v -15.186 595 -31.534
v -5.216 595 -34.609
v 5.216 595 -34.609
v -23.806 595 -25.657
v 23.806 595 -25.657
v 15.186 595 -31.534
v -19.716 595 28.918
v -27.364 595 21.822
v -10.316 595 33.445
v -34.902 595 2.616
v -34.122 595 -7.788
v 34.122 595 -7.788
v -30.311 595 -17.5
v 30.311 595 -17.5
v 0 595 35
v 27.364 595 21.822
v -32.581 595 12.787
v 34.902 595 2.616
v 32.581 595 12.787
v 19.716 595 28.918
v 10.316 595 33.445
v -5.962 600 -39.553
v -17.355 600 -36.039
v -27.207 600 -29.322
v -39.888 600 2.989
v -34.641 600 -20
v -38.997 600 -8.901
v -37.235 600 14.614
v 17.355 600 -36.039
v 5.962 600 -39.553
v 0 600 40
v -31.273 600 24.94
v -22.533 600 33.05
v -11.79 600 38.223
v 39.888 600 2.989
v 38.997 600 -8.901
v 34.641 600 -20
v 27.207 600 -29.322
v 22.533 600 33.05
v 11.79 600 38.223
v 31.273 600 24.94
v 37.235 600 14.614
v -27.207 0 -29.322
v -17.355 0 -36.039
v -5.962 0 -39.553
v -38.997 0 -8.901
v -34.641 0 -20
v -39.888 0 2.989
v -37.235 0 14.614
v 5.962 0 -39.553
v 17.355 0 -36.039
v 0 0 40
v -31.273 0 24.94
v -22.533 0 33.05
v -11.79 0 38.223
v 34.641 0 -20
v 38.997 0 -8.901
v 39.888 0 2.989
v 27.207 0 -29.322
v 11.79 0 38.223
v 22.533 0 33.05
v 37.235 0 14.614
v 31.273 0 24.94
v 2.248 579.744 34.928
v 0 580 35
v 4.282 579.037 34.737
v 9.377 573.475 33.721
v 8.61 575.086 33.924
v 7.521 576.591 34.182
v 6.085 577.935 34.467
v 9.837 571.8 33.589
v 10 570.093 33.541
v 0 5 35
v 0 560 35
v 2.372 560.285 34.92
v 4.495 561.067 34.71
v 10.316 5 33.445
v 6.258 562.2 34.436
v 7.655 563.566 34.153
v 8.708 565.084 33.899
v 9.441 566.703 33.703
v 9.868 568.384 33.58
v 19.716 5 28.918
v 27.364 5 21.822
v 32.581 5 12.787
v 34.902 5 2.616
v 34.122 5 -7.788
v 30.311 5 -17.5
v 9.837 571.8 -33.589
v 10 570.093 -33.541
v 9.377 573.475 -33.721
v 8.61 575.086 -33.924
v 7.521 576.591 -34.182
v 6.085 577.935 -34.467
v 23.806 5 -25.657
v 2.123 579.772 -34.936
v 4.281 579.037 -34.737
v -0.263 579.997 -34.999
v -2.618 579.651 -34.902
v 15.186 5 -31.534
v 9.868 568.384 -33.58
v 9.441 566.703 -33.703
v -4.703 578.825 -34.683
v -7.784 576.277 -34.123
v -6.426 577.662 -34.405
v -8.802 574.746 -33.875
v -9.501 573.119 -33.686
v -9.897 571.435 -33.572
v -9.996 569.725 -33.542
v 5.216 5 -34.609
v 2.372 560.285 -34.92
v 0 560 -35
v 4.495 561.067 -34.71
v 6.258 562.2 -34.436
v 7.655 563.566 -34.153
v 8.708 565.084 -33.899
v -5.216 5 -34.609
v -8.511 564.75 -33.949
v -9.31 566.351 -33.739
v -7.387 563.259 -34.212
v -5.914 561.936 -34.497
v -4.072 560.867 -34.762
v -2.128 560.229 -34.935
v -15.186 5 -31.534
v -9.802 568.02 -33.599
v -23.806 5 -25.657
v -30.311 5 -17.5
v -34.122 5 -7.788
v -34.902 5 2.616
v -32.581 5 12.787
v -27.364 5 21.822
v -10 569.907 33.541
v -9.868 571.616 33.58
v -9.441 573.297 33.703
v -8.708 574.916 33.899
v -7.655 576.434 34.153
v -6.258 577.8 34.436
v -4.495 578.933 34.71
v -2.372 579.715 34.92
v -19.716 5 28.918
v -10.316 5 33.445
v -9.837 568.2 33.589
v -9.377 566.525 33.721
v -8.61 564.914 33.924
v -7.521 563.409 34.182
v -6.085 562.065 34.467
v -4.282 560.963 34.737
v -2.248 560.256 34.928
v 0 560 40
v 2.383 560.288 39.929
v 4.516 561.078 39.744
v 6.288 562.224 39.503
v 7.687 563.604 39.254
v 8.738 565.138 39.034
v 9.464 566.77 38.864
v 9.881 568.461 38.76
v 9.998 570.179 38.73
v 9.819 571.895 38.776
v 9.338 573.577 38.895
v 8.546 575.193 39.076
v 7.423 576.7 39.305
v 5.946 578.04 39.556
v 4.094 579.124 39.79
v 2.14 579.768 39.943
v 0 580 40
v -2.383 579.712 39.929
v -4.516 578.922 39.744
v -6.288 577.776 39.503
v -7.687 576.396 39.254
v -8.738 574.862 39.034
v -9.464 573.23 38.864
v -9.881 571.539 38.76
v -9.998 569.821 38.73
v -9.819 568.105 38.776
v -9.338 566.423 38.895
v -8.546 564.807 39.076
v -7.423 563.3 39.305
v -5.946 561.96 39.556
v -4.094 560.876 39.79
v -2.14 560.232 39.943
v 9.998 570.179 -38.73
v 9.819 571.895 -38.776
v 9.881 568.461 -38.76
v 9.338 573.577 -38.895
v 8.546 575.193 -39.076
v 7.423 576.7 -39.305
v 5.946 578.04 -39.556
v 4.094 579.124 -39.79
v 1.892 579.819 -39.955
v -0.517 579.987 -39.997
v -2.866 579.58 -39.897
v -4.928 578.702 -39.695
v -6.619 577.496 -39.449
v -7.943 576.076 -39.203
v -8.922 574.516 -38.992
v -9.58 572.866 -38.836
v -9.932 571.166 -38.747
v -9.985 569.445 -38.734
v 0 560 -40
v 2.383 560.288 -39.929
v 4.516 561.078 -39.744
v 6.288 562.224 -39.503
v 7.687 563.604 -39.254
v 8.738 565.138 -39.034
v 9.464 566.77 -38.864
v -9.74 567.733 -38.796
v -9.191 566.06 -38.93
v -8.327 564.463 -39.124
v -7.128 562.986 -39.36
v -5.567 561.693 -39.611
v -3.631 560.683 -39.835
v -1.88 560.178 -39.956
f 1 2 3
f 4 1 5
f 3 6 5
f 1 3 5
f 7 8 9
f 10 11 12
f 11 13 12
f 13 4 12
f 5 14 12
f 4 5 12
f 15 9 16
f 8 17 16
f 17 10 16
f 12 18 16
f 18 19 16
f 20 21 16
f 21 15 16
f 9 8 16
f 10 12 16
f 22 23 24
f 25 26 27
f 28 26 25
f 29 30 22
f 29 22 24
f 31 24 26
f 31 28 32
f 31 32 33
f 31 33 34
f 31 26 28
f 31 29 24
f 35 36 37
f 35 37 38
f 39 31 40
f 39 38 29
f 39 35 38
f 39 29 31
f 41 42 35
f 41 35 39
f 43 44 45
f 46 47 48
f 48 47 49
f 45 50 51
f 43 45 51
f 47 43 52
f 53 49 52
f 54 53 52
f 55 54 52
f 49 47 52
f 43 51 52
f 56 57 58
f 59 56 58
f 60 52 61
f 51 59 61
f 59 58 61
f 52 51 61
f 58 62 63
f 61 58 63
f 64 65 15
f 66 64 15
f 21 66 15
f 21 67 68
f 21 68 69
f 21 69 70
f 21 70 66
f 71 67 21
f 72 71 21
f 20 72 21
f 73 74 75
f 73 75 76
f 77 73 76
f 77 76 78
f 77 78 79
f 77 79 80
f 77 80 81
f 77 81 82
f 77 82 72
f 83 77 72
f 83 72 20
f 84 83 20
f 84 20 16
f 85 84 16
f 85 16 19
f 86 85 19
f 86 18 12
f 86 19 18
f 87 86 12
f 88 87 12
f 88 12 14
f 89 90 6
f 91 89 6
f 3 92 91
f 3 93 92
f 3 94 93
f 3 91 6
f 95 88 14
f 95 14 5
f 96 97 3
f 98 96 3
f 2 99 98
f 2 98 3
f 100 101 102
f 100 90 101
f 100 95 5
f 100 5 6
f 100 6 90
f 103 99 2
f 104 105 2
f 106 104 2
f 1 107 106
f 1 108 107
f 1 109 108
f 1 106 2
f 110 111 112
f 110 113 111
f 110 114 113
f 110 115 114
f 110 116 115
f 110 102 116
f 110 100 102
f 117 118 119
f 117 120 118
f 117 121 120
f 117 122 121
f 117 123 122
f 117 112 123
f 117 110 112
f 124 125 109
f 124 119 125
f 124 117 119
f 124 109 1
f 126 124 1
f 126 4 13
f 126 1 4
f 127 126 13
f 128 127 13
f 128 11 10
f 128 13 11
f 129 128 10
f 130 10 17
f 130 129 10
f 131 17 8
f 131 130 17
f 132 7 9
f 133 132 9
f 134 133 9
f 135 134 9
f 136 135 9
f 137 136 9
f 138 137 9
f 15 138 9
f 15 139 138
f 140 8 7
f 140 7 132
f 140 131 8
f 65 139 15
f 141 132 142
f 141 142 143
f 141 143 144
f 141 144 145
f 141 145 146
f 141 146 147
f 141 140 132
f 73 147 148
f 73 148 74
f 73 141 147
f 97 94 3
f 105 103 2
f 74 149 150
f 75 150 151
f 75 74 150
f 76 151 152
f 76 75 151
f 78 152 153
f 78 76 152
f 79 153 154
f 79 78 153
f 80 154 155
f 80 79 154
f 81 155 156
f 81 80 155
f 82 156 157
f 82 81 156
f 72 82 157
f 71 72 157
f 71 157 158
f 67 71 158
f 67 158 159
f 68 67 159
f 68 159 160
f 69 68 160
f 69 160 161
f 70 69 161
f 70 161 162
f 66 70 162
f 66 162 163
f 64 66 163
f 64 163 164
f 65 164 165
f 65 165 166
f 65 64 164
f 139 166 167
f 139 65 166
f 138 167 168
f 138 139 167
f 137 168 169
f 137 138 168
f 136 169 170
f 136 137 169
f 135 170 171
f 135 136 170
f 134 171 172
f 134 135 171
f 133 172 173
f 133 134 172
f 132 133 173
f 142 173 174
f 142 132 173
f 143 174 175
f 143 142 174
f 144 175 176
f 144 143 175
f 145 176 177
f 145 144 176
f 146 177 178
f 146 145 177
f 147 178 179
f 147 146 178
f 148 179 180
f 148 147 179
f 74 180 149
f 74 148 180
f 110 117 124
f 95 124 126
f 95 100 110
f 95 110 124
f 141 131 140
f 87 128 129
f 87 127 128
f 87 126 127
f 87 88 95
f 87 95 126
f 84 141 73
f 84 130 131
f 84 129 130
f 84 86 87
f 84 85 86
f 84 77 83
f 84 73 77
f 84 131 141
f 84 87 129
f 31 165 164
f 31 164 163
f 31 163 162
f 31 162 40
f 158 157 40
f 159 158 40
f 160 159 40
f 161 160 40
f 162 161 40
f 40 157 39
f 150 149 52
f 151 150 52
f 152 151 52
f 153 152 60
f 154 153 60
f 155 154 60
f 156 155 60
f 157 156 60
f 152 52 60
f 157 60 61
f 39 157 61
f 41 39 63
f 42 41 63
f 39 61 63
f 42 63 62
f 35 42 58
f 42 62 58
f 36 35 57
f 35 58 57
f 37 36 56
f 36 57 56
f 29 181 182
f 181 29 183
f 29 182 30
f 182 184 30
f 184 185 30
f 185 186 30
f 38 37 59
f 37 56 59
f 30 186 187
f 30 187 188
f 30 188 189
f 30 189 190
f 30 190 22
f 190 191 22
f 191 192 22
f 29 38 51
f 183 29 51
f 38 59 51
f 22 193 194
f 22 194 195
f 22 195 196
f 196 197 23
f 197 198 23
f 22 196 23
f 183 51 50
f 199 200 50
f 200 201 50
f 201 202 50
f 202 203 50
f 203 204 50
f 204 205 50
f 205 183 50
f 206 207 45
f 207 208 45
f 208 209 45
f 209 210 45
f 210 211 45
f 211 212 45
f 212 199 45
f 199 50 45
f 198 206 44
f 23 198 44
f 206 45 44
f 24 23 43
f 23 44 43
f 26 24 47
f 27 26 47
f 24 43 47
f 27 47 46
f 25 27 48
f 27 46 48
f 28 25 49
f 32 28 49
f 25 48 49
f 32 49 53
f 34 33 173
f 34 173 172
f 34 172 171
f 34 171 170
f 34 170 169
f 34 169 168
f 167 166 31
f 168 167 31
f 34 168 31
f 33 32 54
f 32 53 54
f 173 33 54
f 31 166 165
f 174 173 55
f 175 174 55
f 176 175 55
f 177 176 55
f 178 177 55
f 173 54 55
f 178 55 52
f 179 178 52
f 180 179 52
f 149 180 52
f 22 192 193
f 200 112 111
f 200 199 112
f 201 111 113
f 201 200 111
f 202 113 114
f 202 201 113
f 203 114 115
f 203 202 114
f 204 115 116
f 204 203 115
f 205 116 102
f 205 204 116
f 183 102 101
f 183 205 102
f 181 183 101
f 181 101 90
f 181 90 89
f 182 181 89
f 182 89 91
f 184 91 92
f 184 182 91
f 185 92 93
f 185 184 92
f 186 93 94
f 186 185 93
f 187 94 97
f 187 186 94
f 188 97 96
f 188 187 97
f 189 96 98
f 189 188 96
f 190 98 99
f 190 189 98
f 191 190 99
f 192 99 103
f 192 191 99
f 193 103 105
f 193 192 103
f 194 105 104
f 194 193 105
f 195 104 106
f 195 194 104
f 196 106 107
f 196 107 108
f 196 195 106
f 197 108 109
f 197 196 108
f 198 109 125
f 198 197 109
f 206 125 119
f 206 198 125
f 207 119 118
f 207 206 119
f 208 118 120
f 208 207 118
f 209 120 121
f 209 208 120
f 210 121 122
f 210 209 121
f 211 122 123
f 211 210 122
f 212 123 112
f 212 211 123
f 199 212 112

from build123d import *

# Parameters (mm, degrees)
SKETCH1_R               = 40
BOSS_EXTRUDE1_DEPTH     = 600
SHELL7_T                = 5
CUT_EXTRUDE2_DEPTH      = 40
CUT_EXTRUDE2_DEPTH_BACK = 40
SKETCH2_R               = 10


with BuildPart() as part:
    # Sketch1 → Boss-Extrude1 (new body)
    with BuildSketch(Plane(origin=(0, 0, 0), x_dir=(1, 0, 0), z_dir=(0, 1, 0))):
        Circle(SKETCH1_R)
    extrude(amount=BOSS_EXTRUDE1_DEPTH)

    # Shell7 (no face opened: a closed hollow body)
    add(offset(amount=-SHELL7_T, mode=Mode.PRIVATE), mode=Mode.SUBTRACT)

    # Sketch2 → Cut-Extrude2 (cut, two sides: drawn at the far end of the back side and taken through both)
    with BuildSketch(Plane.XY.offset(-CUT_EXTRUDE2_DEPTH_BACK)):
        with Locations((0, 570)):
            Circle(SKETCH2_R)
    extrude(amount=CUT_EXTRUDE2_DEPTH + CUT_EXTRUDE2_DEPTH_BACK, mode=Mode.SUBTRACT)


solid = part.part
